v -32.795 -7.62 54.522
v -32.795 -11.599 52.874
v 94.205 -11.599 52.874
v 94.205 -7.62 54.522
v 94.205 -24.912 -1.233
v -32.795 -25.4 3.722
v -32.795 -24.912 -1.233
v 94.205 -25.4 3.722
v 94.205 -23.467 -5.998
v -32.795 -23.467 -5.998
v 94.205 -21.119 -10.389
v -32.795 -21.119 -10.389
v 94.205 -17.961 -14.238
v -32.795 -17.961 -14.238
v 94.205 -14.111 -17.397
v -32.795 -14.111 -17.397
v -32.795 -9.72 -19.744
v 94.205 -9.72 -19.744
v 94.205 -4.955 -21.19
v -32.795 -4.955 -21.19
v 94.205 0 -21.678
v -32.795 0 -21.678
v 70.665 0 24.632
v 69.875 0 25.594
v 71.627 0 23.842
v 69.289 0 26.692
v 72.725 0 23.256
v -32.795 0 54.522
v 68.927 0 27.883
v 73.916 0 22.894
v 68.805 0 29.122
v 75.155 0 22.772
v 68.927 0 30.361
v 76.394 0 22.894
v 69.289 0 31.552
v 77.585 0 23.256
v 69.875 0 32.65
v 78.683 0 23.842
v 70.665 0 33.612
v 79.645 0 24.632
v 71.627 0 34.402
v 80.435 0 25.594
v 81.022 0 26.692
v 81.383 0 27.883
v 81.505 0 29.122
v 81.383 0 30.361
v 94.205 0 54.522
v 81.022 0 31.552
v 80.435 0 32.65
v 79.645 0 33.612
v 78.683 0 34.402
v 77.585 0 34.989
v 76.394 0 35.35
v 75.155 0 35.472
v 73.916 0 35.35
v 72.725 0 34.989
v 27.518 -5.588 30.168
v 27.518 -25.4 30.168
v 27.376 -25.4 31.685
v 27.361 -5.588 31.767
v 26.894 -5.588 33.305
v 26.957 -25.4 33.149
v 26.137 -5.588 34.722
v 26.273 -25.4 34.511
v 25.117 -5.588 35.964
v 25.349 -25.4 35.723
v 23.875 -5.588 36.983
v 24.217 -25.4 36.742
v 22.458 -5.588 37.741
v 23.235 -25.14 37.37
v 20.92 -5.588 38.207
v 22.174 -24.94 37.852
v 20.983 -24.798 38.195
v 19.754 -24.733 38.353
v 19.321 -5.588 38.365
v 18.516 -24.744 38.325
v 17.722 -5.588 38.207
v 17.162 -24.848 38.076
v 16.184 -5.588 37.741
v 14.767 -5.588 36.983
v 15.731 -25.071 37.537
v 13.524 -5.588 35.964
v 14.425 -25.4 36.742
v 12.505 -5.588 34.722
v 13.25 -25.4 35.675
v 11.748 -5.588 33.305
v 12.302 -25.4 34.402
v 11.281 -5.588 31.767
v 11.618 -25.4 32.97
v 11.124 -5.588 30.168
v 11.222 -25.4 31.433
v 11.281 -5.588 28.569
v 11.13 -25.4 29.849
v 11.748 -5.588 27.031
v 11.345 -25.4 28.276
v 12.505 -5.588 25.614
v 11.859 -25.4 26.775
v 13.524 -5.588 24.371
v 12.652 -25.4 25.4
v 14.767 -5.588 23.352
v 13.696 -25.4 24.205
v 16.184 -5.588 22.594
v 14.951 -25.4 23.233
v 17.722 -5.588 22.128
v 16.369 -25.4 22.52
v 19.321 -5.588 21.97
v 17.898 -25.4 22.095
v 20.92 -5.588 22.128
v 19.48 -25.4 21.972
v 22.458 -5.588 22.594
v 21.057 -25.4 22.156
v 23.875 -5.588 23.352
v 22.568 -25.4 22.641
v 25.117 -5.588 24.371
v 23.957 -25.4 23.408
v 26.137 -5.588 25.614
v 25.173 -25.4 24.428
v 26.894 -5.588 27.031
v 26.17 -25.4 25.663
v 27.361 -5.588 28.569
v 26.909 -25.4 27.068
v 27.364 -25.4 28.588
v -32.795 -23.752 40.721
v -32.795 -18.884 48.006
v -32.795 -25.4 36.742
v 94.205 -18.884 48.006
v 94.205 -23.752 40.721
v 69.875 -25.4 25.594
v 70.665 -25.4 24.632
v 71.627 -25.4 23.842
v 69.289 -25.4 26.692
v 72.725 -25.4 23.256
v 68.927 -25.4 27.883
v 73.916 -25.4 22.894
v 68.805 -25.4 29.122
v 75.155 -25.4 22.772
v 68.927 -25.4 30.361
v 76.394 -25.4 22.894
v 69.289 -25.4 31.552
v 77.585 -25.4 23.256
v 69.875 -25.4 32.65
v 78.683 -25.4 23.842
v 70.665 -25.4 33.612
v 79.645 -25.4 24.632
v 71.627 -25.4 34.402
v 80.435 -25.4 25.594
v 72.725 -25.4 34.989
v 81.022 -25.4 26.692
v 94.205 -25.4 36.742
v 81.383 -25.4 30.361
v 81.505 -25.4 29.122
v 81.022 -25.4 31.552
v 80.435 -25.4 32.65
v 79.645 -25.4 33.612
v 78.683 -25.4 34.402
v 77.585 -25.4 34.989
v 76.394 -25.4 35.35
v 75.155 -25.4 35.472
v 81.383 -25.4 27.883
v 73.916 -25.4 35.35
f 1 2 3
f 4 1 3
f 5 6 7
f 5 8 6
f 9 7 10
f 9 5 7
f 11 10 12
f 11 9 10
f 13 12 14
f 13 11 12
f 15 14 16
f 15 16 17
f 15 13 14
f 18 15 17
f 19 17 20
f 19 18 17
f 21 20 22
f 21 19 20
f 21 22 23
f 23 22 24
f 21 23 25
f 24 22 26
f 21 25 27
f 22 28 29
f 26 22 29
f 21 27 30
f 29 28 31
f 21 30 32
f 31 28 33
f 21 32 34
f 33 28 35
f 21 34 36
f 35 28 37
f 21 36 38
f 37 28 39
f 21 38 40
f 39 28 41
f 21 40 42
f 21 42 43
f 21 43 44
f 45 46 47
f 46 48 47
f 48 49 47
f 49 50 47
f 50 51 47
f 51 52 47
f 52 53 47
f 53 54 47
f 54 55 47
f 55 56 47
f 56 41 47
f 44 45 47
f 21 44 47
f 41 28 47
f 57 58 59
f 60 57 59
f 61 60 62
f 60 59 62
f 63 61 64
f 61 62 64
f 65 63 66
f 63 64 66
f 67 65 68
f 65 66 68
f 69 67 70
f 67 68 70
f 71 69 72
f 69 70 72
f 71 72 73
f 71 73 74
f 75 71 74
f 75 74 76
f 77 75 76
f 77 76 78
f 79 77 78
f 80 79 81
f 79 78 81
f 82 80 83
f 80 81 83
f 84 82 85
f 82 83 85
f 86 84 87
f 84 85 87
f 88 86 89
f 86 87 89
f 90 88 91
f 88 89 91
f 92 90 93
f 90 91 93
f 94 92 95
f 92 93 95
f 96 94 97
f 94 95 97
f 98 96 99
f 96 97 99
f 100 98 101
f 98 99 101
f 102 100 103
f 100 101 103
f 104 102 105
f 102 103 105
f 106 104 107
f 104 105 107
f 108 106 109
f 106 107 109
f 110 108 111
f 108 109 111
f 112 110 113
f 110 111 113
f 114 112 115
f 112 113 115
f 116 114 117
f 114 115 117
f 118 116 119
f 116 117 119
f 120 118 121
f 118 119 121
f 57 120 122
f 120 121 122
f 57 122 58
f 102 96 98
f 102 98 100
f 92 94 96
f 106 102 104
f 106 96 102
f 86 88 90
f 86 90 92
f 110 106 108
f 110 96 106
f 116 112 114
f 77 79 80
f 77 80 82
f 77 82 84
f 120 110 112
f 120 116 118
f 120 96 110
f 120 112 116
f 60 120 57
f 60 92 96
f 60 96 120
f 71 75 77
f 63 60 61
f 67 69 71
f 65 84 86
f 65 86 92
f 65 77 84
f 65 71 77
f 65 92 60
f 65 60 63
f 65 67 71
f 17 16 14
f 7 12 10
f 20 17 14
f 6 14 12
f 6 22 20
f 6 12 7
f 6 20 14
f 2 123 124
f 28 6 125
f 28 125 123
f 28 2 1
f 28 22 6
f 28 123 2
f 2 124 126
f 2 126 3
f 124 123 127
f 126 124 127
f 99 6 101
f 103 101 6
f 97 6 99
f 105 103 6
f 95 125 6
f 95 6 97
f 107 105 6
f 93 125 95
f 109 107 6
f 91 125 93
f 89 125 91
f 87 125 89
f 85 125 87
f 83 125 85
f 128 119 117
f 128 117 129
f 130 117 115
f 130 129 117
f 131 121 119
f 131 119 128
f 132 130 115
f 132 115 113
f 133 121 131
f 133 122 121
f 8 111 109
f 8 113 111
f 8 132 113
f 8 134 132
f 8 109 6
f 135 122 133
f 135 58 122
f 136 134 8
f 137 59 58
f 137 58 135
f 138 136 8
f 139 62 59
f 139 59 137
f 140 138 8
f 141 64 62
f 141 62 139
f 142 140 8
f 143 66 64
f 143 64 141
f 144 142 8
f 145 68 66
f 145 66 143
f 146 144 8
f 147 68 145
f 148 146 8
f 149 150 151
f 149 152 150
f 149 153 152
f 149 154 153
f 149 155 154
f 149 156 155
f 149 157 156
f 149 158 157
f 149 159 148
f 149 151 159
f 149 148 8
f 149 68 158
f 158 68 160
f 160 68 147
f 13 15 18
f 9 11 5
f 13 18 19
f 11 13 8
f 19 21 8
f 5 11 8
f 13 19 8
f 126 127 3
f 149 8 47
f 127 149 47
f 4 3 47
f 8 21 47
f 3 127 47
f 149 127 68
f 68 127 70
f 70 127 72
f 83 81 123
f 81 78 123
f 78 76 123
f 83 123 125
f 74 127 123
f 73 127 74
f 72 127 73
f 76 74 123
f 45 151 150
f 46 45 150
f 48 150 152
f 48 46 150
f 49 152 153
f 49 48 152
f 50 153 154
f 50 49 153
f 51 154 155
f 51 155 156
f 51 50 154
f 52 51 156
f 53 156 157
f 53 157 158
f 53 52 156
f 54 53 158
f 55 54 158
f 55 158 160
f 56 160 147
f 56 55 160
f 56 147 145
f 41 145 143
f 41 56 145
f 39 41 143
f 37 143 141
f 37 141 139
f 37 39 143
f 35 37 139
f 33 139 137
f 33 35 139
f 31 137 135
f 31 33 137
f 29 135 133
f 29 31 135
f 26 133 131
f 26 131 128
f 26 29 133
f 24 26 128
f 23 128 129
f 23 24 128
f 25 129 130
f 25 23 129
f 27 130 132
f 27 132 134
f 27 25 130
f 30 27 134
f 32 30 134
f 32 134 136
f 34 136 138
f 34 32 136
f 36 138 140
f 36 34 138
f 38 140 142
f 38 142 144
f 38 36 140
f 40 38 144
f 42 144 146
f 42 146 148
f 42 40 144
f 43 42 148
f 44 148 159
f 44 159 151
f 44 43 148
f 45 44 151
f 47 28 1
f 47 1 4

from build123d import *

# Parameters (mm, degrees)
F0_W        = 127
F0_H        = 76.2
F0_R        = 6.35
F1_DEPTH    = 25.4
F2_R        = 8.1972505448
F3_DEPTH    = 19.812
F4_SIZE     = 12.7
F5_SIZE     = 5.08
F6_T1_DEPTH = 153.3415311919
F7_SIZE     = 5.08
F8_T1_DEPTH = 153.3972220228
F9_R        = 25.39999


# Not quite as in the source:
# - a fillet or chamfer that OpenCascade refuses, or shapes differently, is made with other operations: its cross-section is extruded or revolved along the edge and cut away or added
# - a fillet or chamfer is up to 0.001 mm smaller than in the source, because OpenCascade refuses the exact size


with BuildPart() as f1:
    # F0 (on Front) → F1 (new body)
    with BuildSketch(Plane.XZ):
        with Locations((30.7051779926, 16.4221930265)):
            Rectangle(F0_W, F0_H)
        with Locations((75.1551779926, 29.1221930265)):
            Circle(F0_R, mode=Mode.SUBTRACT)
    extrude(amount=F1_DEPTH)

    # F2 (on face) → F3 (cut)
    with BuildSketch(Plane.XZ.offset(25.4)):
        with Locations((19.3208176643, 30.1677044481)):
            Circle(F2_R)
    extrude(amount=-F3_DEPTH, mode=Mode.SUBTRACT)

    # F4
    f4_edges = [f1.edges().sort_by_distance(p)[0] for p in [
        (30.705178, -25.4, 54.522193),
    ]]
    chamfer(f4_edges, length=F4_SIZE)

    # F5
    f5_edges = [f1.edges().sort_by_distance(p)[0] for p in [
        (30.705178, -12.7, 54.522193),
    ]]
    chamfer(f5_edges, length=F5_SIZE)

    # F6: chamfer of 5.08 on 1 edges, made by hand

    # F6_s2 → F6_t1 (cut)
    with BuildSketch(Plane.YZ.offset(-45.9655876034)):
        Polygon((-21.8078975516, 45.414295475), (-25.4, 36.7421930265), (-25.4, 41.8221930265), align=None)
    extrude(amount=F6_T1_DEPTH, mode=Mode.SUBTRACT)

    # F7
    f7_edges = [f1.edges().sort_by_distance(p)[0] for p in [
        (30.705178, -21.807898, 45.414295),
    ]]
    chamfer(f7_edges, length=F7_SIZE)

    # F8: chamfer of 5.08 on 1 edges, made by hand

    # F8_s2 → F8_t1 (cut)
    with BuildSketch(Plane.YZ.offset(-45.9934330188)):
        Polygon((-19.8842048969, 47.3379881297), (-11.5987944233, 52.8741224145), (-16.2921024484, 50.9300905781), align=None)
    extrude(amount=F8_T1_DEPTH, mode=Mode.SUBTRACT)

    # F9 (radius 25.4 in the source; OpenCascade refuses exactly that, so slightly less here)
    f9_edges = [f1.edges().sort_by_distance(p)[0] for p in [
        (30.705178, -25.4, -21.677807),
    ]]
    fillet(f9_edges, radius=F9_R)


solid = f1.part
